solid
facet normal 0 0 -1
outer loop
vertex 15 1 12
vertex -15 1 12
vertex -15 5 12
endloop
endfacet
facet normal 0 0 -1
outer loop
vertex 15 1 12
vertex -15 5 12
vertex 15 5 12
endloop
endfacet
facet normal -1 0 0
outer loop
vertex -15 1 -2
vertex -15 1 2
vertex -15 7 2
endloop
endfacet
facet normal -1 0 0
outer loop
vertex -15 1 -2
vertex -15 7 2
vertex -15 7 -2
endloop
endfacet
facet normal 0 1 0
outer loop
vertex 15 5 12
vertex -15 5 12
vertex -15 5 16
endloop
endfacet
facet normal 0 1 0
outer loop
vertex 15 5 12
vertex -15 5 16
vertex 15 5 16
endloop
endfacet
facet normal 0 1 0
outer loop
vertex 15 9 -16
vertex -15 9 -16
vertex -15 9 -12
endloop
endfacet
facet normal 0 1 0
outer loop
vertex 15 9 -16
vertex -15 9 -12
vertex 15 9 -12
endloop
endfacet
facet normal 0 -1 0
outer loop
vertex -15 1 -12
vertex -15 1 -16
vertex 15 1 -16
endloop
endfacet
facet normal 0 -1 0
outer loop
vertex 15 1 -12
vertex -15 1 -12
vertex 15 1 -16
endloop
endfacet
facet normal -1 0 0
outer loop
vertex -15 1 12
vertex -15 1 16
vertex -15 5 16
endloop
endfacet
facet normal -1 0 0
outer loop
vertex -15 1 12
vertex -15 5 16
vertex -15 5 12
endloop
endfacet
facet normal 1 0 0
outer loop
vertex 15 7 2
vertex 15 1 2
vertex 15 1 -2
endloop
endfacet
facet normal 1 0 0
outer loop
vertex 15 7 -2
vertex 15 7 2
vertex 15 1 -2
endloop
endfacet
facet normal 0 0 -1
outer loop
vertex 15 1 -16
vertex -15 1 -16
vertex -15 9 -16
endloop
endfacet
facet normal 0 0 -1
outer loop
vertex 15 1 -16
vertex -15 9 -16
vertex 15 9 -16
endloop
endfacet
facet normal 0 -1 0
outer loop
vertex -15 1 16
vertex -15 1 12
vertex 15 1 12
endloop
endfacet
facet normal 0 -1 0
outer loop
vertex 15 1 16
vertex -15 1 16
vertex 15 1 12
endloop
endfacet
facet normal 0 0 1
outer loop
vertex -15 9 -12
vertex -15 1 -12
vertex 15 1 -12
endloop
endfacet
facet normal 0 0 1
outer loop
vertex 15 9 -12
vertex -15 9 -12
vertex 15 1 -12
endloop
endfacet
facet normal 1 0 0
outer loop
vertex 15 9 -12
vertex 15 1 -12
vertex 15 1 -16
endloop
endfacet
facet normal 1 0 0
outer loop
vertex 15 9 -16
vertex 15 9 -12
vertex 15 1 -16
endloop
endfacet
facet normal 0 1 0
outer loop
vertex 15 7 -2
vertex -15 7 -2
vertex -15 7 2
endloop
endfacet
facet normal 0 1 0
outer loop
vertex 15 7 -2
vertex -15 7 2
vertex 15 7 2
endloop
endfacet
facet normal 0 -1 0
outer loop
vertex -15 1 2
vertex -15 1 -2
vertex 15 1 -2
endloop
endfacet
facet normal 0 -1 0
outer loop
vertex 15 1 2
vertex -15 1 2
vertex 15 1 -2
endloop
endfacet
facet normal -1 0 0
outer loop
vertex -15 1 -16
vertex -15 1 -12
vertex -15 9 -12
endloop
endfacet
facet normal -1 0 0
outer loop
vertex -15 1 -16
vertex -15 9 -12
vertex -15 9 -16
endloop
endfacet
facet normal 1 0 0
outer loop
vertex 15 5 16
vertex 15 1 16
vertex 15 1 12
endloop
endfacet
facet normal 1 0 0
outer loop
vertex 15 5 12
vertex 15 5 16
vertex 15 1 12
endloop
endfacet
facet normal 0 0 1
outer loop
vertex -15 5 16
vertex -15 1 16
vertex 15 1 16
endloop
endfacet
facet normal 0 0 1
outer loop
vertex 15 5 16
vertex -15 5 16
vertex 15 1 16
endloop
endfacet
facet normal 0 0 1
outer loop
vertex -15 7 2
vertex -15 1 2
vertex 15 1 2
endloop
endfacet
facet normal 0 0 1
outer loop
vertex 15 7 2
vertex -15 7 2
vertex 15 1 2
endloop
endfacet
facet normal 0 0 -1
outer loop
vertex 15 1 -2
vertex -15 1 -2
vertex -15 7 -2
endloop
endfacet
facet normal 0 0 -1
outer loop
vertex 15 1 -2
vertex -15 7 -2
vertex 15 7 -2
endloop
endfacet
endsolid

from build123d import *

# Parameters (mm, degrees)
SKETCH2_W           = 30
SKETCH2_H           = 4
BOSS_EXTRUDE1_DEPTH = 4
SKETCH3_W           = 30
SKETCH3_H           = 4
BOSS_EXTRUDE2_DEPTH = 6
SKETCH4_W           = 30
SKETCH4_H           = 4
BOSS_EXTRUDE3_DEPTH = 8


with BuildPart() as part:
    # Sketch2 → Boss-Extrude1 (new body)
    with BuildSketch(Plane(origin=(0, 1, 0), x_dir=(1, 0, 0), z_dir=(0, 1, 0))):
        with Locations((0, -14)):
            Rectangle(SKETCH2_W, SKETCH2_H)
    extrude(amount=BOSS_EXTRUDE1_DEPTH)


with BuildPart() as body_2:
    # Sketch3 → Boss-Extrude2 (new body)
    with BuildSketch(Plane(origin=(0, 1, 0), x_dir=(1, 0, 0), z_dir=(0, 1, 0))):
        Rectangle(SKETCH3_W, SKETCH3_H)
    extrude(amount=BOSS_EXTRUDE2_DEPTH)


with BuildPart() as body_3:
    # Sketch4 → Boss-Extrude3 (new body)
    with BuildSketch(Plane(origin=(0, 1, 0), x_dir=(1, 0, 0), z_dir=(0, 1, 0))):
        with Locations((0, 14)):
            Rectangle(SKETCH4_W, SKETCH4_H)
    extrude(amount=BOSS_EXTRUDE3_DEPTH)


solid = Compound([part.part, body_2.part, body_3.part])
